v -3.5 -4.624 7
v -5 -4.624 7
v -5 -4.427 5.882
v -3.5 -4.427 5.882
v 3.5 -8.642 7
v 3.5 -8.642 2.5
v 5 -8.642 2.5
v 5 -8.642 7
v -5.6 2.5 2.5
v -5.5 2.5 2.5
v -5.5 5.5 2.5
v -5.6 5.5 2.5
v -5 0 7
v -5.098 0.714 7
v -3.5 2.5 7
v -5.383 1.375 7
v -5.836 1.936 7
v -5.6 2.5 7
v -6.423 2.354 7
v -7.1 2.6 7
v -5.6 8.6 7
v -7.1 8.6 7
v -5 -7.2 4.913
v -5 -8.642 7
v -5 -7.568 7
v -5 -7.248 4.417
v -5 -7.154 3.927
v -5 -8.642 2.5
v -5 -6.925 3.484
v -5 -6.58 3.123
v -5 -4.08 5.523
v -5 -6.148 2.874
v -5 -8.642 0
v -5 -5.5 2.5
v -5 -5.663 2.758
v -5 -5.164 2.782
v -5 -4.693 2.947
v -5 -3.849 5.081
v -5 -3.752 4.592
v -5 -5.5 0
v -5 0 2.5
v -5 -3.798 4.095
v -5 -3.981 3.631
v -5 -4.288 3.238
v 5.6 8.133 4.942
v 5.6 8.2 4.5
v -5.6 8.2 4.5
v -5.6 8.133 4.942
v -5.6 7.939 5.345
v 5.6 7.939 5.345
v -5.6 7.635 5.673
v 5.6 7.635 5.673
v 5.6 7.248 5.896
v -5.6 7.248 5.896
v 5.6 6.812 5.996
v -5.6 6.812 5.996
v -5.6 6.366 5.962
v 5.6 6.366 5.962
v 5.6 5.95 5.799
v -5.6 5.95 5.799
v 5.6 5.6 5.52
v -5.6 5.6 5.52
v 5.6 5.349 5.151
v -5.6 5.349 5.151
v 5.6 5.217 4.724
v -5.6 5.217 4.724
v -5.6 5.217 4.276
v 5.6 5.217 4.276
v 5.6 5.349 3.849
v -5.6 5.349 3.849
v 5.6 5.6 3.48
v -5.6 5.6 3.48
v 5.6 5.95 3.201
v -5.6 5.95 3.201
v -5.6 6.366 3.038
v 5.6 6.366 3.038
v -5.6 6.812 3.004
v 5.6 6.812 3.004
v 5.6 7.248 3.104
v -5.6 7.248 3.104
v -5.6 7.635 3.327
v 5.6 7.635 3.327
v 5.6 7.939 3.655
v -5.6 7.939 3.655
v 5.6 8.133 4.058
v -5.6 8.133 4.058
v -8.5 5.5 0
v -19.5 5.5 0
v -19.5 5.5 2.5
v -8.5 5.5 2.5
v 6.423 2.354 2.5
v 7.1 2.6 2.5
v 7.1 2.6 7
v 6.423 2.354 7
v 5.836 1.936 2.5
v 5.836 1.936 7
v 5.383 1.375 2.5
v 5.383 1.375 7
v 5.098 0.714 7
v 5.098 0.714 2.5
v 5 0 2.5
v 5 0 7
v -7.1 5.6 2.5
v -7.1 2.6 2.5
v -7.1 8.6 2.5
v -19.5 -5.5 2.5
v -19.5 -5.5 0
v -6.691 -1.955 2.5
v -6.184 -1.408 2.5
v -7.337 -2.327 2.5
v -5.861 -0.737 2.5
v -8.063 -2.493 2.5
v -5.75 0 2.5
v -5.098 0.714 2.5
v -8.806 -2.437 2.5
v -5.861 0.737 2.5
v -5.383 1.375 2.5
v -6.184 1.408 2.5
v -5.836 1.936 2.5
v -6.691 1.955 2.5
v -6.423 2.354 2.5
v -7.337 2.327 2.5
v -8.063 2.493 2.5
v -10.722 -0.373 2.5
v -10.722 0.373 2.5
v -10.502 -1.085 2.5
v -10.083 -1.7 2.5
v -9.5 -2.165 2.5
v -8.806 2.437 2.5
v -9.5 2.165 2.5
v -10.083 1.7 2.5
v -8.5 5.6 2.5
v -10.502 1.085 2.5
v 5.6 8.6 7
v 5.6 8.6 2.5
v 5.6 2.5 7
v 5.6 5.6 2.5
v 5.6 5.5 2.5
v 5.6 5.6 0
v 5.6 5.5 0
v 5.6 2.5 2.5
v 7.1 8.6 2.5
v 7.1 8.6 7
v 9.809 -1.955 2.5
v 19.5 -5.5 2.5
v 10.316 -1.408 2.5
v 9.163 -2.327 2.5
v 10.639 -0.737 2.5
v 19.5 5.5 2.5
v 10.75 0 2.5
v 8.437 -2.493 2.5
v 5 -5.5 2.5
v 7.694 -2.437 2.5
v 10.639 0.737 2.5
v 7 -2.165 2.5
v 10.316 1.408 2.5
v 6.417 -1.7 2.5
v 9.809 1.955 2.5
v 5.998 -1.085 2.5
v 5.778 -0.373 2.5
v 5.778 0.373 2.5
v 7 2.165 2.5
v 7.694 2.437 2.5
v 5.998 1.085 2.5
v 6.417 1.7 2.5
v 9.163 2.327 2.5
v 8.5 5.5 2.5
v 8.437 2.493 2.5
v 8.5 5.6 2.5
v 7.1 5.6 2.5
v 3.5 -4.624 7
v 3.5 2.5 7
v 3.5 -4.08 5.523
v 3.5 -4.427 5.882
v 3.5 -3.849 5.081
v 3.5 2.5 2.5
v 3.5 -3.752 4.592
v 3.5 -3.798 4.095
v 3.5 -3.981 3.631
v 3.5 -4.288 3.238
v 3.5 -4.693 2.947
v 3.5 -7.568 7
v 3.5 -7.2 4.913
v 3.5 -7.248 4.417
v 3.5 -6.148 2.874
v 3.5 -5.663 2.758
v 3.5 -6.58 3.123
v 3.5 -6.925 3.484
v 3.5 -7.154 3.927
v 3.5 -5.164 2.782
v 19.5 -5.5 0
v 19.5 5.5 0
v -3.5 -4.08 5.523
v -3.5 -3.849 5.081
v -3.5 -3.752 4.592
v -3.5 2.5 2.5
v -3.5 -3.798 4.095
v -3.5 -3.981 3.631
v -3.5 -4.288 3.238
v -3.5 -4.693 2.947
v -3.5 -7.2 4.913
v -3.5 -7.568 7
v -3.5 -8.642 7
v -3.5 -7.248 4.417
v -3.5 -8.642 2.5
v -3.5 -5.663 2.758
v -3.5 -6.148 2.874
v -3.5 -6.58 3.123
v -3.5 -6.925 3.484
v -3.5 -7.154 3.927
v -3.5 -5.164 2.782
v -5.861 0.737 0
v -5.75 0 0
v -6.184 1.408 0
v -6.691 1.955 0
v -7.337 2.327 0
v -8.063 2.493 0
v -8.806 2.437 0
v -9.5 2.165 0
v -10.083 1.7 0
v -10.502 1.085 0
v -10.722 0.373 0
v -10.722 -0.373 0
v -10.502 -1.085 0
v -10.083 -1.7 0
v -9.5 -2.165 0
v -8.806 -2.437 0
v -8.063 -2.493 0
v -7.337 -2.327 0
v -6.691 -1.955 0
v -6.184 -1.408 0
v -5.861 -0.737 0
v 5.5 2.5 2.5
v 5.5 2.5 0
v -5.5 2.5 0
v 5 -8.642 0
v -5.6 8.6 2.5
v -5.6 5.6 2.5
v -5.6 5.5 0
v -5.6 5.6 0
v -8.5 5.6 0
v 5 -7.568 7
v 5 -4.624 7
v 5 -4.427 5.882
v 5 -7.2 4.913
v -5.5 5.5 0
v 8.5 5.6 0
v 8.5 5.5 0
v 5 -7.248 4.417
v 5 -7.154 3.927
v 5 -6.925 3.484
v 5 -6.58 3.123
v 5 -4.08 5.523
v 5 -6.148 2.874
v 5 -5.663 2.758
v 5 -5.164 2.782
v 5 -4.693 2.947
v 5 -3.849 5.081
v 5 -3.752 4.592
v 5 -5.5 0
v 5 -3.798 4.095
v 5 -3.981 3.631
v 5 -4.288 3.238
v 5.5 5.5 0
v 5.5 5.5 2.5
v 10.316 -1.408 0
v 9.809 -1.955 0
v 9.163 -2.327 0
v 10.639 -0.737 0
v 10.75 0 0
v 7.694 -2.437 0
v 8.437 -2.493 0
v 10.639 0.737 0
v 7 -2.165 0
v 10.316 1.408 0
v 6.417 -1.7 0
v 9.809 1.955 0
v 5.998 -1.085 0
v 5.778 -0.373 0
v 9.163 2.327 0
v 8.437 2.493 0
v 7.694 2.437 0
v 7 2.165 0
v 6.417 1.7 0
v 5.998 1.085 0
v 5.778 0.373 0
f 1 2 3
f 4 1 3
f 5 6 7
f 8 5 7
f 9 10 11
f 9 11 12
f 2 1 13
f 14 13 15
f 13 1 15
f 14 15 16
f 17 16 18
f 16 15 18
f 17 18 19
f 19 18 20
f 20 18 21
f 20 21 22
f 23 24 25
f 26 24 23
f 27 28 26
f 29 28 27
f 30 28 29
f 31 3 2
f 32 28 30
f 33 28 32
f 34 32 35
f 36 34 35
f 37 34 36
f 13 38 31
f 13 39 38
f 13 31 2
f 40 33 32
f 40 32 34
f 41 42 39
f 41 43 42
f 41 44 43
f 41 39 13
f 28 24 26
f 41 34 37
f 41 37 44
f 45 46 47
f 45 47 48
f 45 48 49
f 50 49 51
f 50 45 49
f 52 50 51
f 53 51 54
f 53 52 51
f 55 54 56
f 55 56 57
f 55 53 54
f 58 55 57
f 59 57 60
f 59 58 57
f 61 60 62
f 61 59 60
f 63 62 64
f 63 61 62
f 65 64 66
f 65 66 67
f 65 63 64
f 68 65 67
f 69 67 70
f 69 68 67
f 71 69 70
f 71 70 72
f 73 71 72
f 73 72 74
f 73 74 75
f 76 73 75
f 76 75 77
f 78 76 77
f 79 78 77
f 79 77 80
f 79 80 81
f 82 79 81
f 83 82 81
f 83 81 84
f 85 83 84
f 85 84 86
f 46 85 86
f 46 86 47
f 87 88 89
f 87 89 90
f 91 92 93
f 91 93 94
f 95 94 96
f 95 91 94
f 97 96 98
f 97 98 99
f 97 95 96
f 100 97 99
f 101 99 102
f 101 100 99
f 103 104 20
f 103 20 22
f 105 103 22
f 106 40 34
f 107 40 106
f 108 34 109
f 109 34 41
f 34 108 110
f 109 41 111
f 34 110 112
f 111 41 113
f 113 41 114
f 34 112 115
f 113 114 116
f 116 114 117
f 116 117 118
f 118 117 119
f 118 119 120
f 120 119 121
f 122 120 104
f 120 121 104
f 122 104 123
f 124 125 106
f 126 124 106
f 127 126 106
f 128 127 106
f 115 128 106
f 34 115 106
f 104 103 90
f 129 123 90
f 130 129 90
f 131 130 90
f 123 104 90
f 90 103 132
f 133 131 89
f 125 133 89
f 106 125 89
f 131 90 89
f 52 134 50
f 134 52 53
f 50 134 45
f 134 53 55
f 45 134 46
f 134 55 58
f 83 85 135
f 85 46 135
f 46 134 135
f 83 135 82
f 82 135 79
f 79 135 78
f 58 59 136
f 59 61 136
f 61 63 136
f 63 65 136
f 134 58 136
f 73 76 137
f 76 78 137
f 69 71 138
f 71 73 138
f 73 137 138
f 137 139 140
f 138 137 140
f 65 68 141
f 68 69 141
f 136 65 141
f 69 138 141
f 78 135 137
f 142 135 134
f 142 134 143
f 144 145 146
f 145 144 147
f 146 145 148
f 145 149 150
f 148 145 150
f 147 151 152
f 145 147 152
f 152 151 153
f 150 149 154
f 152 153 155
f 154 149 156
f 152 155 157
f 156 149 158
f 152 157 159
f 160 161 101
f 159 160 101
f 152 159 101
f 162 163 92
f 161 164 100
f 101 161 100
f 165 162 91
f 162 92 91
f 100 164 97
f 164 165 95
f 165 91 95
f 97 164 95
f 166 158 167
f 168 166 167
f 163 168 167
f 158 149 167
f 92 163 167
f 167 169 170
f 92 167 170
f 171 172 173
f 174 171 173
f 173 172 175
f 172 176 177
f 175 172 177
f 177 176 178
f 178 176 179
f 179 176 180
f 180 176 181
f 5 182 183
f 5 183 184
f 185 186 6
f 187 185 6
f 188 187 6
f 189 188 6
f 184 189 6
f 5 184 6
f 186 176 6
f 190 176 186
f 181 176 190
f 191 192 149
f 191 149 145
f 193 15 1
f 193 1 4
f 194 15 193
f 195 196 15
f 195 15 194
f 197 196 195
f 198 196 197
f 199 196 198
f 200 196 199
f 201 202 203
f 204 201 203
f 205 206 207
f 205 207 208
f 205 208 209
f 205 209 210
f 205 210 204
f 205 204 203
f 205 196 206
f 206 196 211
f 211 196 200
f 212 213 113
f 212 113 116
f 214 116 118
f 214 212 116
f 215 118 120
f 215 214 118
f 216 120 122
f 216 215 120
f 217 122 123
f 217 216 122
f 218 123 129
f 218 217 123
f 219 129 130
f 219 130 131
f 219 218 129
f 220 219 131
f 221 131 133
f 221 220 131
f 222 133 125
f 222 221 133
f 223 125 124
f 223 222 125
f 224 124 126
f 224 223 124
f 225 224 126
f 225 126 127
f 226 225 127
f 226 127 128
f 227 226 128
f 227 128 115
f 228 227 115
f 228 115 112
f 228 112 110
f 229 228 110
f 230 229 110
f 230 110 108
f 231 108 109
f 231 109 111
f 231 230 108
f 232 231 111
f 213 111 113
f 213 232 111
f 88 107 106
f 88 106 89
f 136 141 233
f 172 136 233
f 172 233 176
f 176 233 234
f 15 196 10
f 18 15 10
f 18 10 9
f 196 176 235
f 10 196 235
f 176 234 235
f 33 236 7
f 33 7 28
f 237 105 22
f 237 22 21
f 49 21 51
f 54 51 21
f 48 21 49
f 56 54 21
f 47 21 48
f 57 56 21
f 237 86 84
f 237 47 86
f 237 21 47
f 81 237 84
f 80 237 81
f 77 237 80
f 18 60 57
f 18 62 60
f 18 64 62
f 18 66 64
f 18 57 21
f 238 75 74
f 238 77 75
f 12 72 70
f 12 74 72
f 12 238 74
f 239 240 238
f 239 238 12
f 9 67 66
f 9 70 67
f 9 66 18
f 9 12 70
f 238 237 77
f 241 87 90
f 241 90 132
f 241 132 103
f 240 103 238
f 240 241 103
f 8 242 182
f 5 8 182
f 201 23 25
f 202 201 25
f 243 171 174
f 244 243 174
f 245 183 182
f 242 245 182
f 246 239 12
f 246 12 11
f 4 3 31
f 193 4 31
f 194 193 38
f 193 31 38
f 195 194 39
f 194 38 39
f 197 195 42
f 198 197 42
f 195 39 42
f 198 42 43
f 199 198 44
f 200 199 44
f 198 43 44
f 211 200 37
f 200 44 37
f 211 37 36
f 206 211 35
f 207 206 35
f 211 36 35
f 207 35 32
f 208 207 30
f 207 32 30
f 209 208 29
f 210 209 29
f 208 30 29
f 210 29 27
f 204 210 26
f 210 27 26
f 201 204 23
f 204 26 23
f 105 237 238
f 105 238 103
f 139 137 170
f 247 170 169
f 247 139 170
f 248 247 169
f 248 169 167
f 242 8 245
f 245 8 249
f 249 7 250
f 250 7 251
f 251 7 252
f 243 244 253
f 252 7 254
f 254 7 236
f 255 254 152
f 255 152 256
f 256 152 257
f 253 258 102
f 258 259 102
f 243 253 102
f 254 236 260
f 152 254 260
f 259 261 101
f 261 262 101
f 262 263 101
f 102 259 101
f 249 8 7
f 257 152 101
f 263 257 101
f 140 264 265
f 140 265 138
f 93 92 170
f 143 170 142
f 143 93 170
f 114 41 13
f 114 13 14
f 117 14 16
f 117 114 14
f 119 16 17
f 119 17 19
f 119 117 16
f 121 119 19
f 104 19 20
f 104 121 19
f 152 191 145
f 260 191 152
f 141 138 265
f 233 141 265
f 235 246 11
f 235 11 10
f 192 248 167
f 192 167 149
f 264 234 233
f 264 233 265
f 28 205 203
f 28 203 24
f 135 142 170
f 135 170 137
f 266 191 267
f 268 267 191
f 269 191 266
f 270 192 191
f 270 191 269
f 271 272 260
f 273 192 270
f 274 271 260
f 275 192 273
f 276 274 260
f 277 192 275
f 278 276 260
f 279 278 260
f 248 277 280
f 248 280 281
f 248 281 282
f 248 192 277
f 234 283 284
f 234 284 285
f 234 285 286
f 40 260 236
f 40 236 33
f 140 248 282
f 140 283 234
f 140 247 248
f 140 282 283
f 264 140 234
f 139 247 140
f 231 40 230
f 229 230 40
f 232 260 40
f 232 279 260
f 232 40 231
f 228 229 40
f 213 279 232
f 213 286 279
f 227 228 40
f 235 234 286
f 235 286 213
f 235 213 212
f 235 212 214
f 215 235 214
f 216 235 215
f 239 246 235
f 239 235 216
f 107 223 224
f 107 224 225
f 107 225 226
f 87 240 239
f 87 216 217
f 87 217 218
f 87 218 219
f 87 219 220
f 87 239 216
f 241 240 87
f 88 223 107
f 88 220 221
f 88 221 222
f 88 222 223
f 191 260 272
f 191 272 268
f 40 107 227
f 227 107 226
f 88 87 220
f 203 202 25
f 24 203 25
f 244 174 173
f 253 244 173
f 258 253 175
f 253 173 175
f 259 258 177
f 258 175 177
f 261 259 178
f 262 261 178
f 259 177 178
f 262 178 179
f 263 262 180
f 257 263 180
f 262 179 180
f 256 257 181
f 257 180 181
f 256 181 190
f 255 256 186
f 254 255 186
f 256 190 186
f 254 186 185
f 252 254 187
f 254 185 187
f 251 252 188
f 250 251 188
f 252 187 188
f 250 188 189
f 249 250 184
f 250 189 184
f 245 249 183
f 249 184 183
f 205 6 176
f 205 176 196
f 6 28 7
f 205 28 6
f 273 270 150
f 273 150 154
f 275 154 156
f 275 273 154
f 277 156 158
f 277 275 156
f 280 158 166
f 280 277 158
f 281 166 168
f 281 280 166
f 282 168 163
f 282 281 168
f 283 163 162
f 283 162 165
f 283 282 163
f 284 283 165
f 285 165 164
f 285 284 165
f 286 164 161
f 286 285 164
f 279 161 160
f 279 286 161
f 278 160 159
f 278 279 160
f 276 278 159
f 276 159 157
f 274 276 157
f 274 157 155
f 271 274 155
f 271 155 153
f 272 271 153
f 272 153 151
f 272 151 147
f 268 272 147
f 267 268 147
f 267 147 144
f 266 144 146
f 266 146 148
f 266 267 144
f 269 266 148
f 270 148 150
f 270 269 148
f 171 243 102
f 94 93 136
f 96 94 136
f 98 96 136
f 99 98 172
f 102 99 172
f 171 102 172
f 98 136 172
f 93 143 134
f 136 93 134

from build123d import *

# Parameters (mm, degrees)
SKETCH_R     = 2.5
PAD_DEPTH    = 2.5
PAD001_DEPTH = 4.5
SKETCH002_R  = 1.5
PAD002_DEPTH = 14.2
POCKET_DEPTH = 10


with BuildPart() as part:
    # Sketch → Pad (new body)
    with BuildSketch(Plane.XY):
        Polygon((19.5, 5.5), (19.5, -5.5), (5, -5.5), (5, -8.641544), (-5, -8.641544), (-5, -5.5), (-19.5, -5.5), (-19.5, 5.5), (-8.5, 5.5), (-8.5, 5.6), (-5.6, 5.6), (-5.6, 5.5), (-5.5, 5.5), (-5.5, 2.5), (5.5, 2.5), (5.5, 5.5), (5.6, 5.5), (5.6, 5.6), (8.5, 5.6), (8.5, 5.5), align=None)
        with Locations((-8.25, 0)):
            Circle(SKETCH_R, mode=Mode.SUBTRACT)
        with Locations((8.25, 0)):
            Circle(SKETCH_R, mode=Mode.SUBTRACT)
    extrude(amount=PAD_DEPTH)

    # Sketch001 (on Face24 of Pad) → Pad001 (join)
    with BuildSketch(Plane.XY.offset(2.5)):
        with BuildLine():
            Line((5.6, 5.6), (5.6, 8.6))
            Line((5.6, 8.6), (7.1, 8.6))
            Line((7.1, 8.6), (7.1, 2.6))
            ThreePointArc((7.1, 2.6), (5.590571, 1.671077), (5, 0))
            Line((5, -8.641543), (5, 0))
            Line((3.5, -8.641543), (5, -8.641543))
            Line((3.5, 2.5), (3.5, -8.641543))
            Line((5.6, 2.5), (3.5, 2.5))
            Line((5.6, 5.6), (5.6, 2.5))
        make_face()
        with BuildLine():
            Line((-7.1, 8.6), (-5.6, 8.6))
            Line((-5.6, 8.6), (-5.6, 2.5))
            Line((-5.6, 2.5), (-3.5, 2.5))
            Line((-3.5, 2.5), (-3.5, -8.641543))
            Line((-3.5, -8.641543), (-5, -8.641543))
            Line((-5, -8.641543), (-5, 0))
            ThreePointArc((-5, 0), (-5.590571, 1.671077), (-7.1, 2.6))
            Line((-7.1, 2.6), (-7.1, 8.6))
        make_face()
    extrude(amount=PAD001_DEPTH)

    # Sketch002 (on Face44 of Pad001) → Pad002 (join)
    with BuildSketch(Plane.YZ.offset(7.1)):
        with Locations((6.7, 4.5)):
            Circle(SKETCH002_R)
    extrude(amount=-PAD002_DEPTH)

    # Sketch003 (on Face35 of Pad002) → Pocket (cut)
    with BuildSketch(Plane(origin=(-5, 0, 0), x_dir=(0, -1, 0), z_dir=(-1, 0, 0))):
        with BuildLine():
            ThreePointArc((4.426559, 5.882108), (4.923015, 2.847853), (7.20048, 4.913363))
            Line((7.20048, 4.913363), (7.655942, 7.49642))
            Line((4.8, 8), (7.655942, 7.49642))
            Line((4.8, 8), (4.426559, 5.882108))
        make_face()
    extrude(amount=-POCKET_DEPTH, mode=Mode.SUBTRACT)


solid = part.part
